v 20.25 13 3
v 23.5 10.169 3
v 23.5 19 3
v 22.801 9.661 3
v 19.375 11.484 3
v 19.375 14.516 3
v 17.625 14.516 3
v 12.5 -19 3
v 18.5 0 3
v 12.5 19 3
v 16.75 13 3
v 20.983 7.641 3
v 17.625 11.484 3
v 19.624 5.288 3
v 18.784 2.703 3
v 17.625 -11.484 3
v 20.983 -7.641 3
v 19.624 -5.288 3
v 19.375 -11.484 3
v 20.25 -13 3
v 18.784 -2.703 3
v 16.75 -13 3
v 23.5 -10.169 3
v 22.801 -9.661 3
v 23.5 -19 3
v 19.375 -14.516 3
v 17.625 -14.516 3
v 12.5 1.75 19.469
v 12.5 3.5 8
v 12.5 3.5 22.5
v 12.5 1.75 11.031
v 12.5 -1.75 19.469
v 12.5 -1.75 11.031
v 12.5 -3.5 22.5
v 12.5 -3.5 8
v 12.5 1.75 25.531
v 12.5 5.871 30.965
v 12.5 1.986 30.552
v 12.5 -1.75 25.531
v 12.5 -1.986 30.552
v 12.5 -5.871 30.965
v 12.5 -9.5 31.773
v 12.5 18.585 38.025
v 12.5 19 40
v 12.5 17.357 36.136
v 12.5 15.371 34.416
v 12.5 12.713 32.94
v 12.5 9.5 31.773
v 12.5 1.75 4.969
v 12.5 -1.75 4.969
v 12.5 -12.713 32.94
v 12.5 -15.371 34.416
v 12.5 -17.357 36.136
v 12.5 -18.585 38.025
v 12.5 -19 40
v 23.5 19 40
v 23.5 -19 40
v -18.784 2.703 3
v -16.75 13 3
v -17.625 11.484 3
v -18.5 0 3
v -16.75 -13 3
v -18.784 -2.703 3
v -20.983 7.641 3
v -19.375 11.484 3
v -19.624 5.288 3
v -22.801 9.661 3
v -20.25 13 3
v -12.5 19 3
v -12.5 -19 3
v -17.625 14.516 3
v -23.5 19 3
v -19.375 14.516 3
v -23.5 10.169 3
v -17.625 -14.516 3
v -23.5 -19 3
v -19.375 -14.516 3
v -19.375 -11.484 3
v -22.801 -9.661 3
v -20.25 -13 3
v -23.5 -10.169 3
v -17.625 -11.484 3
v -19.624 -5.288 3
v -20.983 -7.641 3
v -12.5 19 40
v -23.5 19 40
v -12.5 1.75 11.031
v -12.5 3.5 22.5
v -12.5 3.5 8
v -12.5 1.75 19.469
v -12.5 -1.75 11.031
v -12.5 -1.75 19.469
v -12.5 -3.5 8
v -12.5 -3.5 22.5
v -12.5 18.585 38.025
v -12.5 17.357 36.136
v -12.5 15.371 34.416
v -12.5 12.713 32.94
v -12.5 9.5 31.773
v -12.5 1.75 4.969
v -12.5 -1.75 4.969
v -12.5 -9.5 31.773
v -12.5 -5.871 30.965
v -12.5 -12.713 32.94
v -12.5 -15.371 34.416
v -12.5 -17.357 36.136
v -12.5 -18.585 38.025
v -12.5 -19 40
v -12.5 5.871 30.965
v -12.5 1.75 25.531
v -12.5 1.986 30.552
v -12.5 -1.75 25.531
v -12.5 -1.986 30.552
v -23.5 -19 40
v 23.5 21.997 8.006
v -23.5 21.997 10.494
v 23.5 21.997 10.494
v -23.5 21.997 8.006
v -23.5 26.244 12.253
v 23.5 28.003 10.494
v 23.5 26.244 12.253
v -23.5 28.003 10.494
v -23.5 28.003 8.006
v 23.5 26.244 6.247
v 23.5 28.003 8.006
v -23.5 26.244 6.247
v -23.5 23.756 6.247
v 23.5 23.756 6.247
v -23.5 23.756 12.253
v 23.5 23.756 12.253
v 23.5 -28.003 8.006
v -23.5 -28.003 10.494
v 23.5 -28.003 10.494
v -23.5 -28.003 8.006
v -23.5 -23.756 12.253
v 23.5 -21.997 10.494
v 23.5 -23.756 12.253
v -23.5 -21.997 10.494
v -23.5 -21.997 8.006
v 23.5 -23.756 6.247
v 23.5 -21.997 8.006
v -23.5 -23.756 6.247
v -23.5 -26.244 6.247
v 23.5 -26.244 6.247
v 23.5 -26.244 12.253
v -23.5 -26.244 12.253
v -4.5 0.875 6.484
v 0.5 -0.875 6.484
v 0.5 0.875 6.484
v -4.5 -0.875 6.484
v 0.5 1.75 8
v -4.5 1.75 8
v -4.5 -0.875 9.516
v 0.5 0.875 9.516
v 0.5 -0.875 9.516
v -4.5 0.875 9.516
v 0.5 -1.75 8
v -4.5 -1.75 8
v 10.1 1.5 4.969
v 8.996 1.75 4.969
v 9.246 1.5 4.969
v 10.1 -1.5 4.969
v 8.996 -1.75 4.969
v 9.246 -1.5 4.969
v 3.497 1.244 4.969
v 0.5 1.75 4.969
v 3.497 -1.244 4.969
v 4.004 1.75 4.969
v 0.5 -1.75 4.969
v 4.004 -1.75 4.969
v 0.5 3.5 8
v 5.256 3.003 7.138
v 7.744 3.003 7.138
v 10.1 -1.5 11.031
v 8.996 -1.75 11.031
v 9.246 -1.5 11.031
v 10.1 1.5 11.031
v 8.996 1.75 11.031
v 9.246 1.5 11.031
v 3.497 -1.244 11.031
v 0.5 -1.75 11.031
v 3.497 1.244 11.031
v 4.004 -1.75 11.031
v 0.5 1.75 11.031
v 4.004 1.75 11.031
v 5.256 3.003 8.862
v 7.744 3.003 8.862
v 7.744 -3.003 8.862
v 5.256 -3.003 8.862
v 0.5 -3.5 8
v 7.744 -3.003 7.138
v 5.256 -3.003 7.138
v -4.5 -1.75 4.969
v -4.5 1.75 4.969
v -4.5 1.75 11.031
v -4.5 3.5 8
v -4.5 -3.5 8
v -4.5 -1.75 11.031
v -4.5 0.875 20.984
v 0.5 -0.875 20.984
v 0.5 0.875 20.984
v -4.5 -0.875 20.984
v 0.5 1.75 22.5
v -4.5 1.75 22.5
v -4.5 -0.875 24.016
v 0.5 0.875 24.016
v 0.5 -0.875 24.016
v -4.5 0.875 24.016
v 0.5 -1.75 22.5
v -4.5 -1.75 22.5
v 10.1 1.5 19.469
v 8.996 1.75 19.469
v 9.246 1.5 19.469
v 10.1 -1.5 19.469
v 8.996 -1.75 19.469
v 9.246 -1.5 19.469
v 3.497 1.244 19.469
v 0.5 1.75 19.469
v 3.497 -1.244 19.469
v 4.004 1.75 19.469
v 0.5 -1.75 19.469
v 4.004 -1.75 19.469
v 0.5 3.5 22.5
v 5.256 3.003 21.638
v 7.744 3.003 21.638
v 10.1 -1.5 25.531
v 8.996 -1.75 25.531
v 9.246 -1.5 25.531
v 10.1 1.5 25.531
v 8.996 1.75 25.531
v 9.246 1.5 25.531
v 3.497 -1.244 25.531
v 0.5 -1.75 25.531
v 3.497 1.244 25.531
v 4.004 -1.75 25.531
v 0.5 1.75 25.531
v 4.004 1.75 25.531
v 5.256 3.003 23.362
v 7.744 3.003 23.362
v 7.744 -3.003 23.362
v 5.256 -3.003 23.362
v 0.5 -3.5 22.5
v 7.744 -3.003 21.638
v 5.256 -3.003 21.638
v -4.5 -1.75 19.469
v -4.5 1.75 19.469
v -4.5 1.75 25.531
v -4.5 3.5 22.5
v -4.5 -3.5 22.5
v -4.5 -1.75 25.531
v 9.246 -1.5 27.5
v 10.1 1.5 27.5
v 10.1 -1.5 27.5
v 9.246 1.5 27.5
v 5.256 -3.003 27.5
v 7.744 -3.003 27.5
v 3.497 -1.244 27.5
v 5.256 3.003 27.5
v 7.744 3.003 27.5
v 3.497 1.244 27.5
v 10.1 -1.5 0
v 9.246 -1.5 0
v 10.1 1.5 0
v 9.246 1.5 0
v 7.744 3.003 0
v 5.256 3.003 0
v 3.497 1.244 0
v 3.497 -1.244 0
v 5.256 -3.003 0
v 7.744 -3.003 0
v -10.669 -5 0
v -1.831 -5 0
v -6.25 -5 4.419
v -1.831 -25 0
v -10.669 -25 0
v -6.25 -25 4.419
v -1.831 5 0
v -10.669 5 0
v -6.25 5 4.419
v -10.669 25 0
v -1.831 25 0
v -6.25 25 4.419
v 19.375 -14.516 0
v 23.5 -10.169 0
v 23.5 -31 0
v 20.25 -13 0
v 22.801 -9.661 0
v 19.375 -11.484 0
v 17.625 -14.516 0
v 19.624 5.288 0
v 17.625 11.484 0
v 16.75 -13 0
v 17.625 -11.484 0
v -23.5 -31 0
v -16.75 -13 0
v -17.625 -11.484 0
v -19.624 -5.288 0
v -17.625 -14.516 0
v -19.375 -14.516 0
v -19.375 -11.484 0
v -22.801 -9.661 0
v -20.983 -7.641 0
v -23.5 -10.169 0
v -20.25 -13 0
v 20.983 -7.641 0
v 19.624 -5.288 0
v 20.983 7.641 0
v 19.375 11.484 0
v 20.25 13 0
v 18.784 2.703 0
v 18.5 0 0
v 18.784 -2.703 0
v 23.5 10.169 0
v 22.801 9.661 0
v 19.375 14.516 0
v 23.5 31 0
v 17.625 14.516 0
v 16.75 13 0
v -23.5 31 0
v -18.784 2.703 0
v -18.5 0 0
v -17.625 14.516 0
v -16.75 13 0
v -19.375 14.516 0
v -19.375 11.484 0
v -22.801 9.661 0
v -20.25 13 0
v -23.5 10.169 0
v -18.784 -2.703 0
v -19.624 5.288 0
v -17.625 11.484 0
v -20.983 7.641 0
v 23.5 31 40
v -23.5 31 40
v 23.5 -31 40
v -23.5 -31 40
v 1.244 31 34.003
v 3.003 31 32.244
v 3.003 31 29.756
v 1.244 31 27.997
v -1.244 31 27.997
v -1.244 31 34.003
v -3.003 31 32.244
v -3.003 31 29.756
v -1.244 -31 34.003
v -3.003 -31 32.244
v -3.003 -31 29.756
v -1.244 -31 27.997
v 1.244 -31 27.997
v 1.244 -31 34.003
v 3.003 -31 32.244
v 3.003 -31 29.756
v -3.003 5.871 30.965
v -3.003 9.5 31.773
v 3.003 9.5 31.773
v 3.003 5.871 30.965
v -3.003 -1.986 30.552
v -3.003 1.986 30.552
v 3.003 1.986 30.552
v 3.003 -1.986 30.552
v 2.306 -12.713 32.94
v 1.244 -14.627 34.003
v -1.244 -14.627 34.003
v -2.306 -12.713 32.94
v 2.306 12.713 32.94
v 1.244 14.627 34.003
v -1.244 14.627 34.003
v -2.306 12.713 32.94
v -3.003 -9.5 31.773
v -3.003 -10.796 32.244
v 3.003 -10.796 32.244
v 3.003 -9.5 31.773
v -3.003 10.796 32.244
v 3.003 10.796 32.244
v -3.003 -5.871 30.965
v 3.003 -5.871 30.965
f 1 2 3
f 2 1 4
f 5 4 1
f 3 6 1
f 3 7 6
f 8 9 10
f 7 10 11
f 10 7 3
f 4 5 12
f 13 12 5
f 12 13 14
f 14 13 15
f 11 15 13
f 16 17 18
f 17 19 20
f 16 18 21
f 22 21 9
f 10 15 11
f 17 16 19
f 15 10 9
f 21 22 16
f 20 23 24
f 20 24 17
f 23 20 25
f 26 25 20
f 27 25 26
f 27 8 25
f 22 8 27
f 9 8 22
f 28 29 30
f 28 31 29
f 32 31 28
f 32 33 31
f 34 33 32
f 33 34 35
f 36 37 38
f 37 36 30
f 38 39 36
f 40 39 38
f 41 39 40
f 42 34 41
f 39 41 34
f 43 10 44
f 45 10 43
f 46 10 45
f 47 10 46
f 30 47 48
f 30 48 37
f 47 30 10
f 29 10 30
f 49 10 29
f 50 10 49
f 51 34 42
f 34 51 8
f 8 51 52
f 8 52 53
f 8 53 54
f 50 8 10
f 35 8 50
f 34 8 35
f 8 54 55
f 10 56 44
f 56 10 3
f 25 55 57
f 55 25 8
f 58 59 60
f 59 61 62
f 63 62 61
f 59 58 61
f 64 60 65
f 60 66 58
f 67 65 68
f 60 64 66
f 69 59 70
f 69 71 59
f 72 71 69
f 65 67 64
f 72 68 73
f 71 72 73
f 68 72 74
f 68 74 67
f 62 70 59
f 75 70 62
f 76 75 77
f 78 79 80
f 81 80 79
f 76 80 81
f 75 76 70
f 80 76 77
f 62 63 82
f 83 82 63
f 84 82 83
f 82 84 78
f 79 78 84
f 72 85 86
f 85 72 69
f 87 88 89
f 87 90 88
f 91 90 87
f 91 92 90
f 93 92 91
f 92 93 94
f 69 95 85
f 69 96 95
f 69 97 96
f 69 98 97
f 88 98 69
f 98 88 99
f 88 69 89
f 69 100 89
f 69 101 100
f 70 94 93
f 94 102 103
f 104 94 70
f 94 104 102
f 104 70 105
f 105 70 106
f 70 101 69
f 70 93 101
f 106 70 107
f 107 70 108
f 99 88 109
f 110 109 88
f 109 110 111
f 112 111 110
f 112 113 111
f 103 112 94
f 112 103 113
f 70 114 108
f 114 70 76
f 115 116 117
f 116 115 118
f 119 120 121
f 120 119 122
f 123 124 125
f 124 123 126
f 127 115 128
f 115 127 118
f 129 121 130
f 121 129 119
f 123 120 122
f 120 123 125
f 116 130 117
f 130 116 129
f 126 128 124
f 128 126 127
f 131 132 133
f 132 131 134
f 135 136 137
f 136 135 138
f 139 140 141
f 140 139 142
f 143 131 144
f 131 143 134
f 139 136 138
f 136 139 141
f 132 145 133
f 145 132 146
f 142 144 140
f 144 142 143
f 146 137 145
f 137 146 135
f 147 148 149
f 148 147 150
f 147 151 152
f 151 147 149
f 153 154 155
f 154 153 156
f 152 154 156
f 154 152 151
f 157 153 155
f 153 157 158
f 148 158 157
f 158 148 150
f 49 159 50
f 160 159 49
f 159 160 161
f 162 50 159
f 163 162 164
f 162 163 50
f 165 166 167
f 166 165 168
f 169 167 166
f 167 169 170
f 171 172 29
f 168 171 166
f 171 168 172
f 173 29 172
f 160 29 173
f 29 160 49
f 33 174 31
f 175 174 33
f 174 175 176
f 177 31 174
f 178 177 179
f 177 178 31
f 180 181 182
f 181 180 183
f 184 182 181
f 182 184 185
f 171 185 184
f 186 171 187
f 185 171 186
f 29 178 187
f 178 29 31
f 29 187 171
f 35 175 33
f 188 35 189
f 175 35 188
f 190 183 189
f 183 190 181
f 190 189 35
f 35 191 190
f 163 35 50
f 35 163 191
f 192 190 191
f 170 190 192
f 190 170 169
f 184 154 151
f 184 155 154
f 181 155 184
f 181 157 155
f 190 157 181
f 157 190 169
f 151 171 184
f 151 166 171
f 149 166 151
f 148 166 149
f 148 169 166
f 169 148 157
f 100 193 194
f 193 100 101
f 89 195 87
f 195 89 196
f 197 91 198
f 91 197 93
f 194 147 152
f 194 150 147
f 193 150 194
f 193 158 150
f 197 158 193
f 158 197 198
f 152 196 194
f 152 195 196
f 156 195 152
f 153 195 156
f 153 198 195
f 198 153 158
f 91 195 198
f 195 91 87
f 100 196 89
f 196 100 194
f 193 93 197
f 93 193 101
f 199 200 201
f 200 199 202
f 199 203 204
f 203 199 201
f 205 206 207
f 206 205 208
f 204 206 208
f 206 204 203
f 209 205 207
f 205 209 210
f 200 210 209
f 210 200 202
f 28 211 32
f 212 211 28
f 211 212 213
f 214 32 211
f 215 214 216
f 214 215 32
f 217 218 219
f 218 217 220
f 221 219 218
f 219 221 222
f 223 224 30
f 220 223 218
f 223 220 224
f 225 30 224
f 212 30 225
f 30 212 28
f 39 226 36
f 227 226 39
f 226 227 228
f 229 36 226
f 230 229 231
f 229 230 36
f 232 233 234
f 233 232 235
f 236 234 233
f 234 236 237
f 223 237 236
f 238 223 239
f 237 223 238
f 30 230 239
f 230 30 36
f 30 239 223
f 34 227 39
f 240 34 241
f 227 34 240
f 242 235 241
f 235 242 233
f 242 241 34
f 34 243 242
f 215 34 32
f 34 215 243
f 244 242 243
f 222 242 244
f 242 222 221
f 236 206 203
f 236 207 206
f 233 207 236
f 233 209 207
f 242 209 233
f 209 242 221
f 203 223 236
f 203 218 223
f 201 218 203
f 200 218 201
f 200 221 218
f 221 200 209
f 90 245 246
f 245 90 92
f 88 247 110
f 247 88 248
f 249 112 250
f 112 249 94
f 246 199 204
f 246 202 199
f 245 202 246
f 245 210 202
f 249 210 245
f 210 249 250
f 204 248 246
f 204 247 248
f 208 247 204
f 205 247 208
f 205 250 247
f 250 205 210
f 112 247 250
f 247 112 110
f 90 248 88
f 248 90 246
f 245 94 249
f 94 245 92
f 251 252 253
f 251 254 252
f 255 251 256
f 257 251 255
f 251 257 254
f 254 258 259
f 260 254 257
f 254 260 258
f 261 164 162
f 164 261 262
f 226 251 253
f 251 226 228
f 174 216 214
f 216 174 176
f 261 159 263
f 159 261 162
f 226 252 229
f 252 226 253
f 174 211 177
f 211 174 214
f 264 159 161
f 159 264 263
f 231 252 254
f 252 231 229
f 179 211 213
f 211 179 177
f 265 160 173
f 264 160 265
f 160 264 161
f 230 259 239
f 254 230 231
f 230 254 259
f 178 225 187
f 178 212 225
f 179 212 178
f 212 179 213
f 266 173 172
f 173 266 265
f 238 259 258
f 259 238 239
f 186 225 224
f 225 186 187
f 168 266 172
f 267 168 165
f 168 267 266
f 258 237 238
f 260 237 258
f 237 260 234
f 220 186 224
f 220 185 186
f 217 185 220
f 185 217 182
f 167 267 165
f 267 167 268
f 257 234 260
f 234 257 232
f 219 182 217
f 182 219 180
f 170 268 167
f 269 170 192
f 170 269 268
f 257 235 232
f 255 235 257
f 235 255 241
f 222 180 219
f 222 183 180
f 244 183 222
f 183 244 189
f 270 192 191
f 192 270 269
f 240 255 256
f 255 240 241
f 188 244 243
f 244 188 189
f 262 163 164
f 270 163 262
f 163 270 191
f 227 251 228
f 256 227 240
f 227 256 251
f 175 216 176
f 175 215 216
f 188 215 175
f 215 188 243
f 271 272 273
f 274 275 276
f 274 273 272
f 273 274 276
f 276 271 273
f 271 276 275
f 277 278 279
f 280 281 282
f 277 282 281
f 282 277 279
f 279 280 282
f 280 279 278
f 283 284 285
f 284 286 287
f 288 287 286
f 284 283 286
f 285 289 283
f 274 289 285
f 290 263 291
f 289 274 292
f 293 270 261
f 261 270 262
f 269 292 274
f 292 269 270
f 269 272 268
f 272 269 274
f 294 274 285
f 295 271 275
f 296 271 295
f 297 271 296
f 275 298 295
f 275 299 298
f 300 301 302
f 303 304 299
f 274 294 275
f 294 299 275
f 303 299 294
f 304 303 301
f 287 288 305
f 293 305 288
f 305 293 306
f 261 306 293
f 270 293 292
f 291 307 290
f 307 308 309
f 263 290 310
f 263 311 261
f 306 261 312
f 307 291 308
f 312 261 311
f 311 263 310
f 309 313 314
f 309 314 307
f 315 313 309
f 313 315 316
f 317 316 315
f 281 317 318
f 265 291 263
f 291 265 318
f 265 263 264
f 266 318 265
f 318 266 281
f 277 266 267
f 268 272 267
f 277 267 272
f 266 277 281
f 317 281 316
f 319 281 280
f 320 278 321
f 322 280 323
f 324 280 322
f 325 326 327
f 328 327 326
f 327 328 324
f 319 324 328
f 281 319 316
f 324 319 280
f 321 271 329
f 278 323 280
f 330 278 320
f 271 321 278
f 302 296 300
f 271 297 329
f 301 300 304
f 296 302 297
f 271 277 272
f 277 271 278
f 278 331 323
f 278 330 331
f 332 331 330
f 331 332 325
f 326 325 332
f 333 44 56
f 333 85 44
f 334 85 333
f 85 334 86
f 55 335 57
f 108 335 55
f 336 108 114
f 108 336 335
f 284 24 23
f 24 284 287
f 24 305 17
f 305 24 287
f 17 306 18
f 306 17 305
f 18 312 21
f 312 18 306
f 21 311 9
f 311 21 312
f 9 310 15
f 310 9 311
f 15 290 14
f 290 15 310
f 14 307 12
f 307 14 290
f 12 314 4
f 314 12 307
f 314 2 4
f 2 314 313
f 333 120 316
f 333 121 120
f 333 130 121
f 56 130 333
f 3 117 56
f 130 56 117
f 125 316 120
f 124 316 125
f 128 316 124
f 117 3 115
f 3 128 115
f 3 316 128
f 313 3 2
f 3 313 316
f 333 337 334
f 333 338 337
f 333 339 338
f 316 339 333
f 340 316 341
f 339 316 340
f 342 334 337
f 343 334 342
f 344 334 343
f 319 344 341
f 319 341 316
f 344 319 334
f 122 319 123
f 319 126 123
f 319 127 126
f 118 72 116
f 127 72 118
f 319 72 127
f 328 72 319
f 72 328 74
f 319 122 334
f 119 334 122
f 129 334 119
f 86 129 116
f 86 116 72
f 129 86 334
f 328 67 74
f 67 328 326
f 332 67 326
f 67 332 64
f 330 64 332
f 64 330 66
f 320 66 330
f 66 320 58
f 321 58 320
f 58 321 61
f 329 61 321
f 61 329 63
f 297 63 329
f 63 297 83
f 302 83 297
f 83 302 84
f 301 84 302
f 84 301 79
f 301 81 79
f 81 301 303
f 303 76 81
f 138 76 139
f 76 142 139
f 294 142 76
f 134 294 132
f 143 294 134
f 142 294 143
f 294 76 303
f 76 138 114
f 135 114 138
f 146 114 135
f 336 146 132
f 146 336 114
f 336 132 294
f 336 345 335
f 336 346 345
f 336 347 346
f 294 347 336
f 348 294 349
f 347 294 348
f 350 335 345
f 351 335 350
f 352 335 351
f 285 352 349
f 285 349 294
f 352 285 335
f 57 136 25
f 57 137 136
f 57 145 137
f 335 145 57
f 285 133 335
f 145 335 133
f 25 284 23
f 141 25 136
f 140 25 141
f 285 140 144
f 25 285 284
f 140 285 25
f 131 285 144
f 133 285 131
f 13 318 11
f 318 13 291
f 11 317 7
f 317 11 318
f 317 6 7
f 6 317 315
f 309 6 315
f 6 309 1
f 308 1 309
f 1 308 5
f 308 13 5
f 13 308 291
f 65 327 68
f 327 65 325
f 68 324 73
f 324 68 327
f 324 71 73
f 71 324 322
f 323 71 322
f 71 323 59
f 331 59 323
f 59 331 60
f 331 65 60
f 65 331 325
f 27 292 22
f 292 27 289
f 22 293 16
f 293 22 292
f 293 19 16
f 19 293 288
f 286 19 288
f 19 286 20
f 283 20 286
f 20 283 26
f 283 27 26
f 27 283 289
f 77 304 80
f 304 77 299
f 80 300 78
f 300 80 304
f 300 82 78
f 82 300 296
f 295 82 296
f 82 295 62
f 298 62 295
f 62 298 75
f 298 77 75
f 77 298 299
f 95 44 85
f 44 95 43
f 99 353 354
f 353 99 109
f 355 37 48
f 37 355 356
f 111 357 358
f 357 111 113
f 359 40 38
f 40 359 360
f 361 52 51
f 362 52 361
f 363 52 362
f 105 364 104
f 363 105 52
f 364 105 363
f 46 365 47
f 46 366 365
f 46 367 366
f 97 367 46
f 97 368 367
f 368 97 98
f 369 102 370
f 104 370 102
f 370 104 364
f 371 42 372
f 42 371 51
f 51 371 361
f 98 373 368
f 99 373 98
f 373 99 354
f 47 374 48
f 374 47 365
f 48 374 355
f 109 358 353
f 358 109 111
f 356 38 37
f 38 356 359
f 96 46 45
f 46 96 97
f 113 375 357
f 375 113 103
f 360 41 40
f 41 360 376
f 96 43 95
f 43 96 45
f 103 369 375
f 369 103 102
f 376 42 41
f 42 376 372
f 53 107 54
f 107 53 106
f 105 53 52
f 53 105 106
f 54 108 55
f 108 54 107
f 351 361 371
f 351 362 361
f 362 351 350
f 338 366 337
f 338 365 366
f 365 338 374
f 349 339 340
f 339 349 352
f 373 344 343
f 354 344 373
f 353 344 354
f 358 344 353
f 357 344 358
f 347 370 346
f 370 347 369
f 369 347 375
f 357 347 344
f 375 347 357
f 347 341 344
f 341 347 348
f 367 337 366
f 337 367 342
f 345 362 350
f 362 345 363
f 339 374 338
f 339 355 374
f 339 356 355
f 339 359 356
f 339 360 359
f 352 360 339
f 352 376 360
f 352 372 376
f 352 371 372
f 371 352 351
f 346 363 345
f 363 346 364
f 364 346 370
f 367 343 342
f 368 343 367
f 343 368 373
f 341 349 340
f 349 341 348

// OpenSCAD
// file: configuration.scad
// default configuration
// m6 rods and nema14 motors

rod_size = 6;
rod_nut_size = 12; //12 for M6, 16 for M8
bearing_size = 12.5; //12 for LM6UU, 15 for LM8UU,LM8SUU
bearing_length = 20; //19 for LM6UU, 17 for LM8SUU, 24 for LM8UU
yz_motor_distance = 25;
motor_screw_spacing = 26; //26 for NEMA14, 31 for NEMA17
motor_casing = 38; //38 for NEMA14, 45 for NEMA17
end_height = 40;
bed_mount_height = 16;
//x_rod_spacing = motor_screw_spacing + 3 + rod_size;
x_rod_spacing = 30;
x_carriage_width = 70;
carriage_extruder_offset = 5;
pulley_size = 20;
idler_pulley_width = 10;
gusset_size = 15;
// main file
// base end

include <configuration.scad>


module base_end() difference() {
	linear_extrude(height = end_height, convexity = 5) difference() {
		square([yz_motor_distance + motor_casing - motor_screw_spacing + 10, motor_casing + rod_size * 4], center = true);
		for(end = [1, -1]) {
			for(side = [1, -1]) translate([end * (yz_motor_distance + motor_casing - motor_screw_spacing) / 2, side * motor_screw_spacing / 2, 0]) circle(3 * 7/12, $fn = 6);
			translate([end * (yz_motor_distance + motor_casing) / 2, 0, 0]) circle(motor_screw_spacing / 2);
		}
	}
	for(end = [1, -1]) translate([end * (yz_motor_distance + motor_casing) / 2, 0, 3]) linear_extrude(height = end_height, convexity = 5) square(motor_casing, center = true);
	for(side = [1, -1]) translate([0, side * (motor_casing / 2 + rod_size), rod_size / 2 + bearing_size / 2]) rotate([90, 180 / 8, 90]) {
		cylinder(r = rod_size * 13/24, h = yz_motor_distance + motor_casing + 20, center = true, $fn = 8);
		%translate([0, 0, -70]) cylinder(r = rod_size * 13/24, h = 200, center = true, $fn = 8);
	}
	translate([0, 0, end_height]) scale([1, 1, .5]) rotate([90, 0, 90]) cylinder(r = motor_casing / 2, h = yz_motor_distance + 20, center = true);
	translate([yz_motor_distance / 2 - rod_size, 0, 0]) {
		translate([0, 0, -3]) linear_extrude(height = end_height - motor_casing / 4, convexity = 5) {
			rotate(180 / 8) circle(rod_size * 13/24, $fn = 8);
			translate([0, -rod_size / 4, 0]) square([rod_size * .6, rod_size / 2]);
		}
		for(h = [8, end_height - motor_casing / 4 - 8]) translate([0, 0, h]) rotate([90, 0, 90]) {
			cylinder(r = 3 * 7/12, h = yz_motor_distance + motor_casing, center = true, $fn = 6);
			translate([0, 0, -rod_size / 2 - 3]) cylinder(r = 3
* 7/6, h = yz_motor_distance + motor_casing, $fn = 6);
			translate([0, 0, 0]) cylinder(r = 3.5, h = yz_motor_distance + motor_casing, $fn = 6);
			translate([0, 0, -rod_size / 2 - 8]) rotate([0, 180, 0]) cylinder(r = 3.5, h = yz_motor_distance + motor_casing, $fn = 6);
		}
	}
	translate([-yz_motor_distance / 2 + bearing_size / 2, 0, -bearing_size * sqrt(2) / 4]) rotate([90, -45, 0]) {
		%cylinder(r = rod_size * 13/24, h = 100, center = true, $fn = 8);
		for(side = [0, 1]) mirror([0, 0, side]) translate([0, 0, rod_size / 2 + 2]) {
			cylinder(r = bearing_size / 2, h = bearing_length, center = false, $fn = 80);
			cube([bearing_size / 2, bearing_size / 2, bearing_length]);
		}
	}
	translate([0, 0, end_height - rod_size * 1.5]) rotate([90, 180 / 8, 0]) cylinder(r = rod_size * 13/24, h = motor_casing + rod_size * 5, $fn = 8, center = true);
	%translate([0, 0, end_height - rod_size * 1.5]) rotate([90, 180 / 8, 0]) cylinder(r = rod_size * 13/24, h = 100, $fn = 8, center = true);
}

base_end();
